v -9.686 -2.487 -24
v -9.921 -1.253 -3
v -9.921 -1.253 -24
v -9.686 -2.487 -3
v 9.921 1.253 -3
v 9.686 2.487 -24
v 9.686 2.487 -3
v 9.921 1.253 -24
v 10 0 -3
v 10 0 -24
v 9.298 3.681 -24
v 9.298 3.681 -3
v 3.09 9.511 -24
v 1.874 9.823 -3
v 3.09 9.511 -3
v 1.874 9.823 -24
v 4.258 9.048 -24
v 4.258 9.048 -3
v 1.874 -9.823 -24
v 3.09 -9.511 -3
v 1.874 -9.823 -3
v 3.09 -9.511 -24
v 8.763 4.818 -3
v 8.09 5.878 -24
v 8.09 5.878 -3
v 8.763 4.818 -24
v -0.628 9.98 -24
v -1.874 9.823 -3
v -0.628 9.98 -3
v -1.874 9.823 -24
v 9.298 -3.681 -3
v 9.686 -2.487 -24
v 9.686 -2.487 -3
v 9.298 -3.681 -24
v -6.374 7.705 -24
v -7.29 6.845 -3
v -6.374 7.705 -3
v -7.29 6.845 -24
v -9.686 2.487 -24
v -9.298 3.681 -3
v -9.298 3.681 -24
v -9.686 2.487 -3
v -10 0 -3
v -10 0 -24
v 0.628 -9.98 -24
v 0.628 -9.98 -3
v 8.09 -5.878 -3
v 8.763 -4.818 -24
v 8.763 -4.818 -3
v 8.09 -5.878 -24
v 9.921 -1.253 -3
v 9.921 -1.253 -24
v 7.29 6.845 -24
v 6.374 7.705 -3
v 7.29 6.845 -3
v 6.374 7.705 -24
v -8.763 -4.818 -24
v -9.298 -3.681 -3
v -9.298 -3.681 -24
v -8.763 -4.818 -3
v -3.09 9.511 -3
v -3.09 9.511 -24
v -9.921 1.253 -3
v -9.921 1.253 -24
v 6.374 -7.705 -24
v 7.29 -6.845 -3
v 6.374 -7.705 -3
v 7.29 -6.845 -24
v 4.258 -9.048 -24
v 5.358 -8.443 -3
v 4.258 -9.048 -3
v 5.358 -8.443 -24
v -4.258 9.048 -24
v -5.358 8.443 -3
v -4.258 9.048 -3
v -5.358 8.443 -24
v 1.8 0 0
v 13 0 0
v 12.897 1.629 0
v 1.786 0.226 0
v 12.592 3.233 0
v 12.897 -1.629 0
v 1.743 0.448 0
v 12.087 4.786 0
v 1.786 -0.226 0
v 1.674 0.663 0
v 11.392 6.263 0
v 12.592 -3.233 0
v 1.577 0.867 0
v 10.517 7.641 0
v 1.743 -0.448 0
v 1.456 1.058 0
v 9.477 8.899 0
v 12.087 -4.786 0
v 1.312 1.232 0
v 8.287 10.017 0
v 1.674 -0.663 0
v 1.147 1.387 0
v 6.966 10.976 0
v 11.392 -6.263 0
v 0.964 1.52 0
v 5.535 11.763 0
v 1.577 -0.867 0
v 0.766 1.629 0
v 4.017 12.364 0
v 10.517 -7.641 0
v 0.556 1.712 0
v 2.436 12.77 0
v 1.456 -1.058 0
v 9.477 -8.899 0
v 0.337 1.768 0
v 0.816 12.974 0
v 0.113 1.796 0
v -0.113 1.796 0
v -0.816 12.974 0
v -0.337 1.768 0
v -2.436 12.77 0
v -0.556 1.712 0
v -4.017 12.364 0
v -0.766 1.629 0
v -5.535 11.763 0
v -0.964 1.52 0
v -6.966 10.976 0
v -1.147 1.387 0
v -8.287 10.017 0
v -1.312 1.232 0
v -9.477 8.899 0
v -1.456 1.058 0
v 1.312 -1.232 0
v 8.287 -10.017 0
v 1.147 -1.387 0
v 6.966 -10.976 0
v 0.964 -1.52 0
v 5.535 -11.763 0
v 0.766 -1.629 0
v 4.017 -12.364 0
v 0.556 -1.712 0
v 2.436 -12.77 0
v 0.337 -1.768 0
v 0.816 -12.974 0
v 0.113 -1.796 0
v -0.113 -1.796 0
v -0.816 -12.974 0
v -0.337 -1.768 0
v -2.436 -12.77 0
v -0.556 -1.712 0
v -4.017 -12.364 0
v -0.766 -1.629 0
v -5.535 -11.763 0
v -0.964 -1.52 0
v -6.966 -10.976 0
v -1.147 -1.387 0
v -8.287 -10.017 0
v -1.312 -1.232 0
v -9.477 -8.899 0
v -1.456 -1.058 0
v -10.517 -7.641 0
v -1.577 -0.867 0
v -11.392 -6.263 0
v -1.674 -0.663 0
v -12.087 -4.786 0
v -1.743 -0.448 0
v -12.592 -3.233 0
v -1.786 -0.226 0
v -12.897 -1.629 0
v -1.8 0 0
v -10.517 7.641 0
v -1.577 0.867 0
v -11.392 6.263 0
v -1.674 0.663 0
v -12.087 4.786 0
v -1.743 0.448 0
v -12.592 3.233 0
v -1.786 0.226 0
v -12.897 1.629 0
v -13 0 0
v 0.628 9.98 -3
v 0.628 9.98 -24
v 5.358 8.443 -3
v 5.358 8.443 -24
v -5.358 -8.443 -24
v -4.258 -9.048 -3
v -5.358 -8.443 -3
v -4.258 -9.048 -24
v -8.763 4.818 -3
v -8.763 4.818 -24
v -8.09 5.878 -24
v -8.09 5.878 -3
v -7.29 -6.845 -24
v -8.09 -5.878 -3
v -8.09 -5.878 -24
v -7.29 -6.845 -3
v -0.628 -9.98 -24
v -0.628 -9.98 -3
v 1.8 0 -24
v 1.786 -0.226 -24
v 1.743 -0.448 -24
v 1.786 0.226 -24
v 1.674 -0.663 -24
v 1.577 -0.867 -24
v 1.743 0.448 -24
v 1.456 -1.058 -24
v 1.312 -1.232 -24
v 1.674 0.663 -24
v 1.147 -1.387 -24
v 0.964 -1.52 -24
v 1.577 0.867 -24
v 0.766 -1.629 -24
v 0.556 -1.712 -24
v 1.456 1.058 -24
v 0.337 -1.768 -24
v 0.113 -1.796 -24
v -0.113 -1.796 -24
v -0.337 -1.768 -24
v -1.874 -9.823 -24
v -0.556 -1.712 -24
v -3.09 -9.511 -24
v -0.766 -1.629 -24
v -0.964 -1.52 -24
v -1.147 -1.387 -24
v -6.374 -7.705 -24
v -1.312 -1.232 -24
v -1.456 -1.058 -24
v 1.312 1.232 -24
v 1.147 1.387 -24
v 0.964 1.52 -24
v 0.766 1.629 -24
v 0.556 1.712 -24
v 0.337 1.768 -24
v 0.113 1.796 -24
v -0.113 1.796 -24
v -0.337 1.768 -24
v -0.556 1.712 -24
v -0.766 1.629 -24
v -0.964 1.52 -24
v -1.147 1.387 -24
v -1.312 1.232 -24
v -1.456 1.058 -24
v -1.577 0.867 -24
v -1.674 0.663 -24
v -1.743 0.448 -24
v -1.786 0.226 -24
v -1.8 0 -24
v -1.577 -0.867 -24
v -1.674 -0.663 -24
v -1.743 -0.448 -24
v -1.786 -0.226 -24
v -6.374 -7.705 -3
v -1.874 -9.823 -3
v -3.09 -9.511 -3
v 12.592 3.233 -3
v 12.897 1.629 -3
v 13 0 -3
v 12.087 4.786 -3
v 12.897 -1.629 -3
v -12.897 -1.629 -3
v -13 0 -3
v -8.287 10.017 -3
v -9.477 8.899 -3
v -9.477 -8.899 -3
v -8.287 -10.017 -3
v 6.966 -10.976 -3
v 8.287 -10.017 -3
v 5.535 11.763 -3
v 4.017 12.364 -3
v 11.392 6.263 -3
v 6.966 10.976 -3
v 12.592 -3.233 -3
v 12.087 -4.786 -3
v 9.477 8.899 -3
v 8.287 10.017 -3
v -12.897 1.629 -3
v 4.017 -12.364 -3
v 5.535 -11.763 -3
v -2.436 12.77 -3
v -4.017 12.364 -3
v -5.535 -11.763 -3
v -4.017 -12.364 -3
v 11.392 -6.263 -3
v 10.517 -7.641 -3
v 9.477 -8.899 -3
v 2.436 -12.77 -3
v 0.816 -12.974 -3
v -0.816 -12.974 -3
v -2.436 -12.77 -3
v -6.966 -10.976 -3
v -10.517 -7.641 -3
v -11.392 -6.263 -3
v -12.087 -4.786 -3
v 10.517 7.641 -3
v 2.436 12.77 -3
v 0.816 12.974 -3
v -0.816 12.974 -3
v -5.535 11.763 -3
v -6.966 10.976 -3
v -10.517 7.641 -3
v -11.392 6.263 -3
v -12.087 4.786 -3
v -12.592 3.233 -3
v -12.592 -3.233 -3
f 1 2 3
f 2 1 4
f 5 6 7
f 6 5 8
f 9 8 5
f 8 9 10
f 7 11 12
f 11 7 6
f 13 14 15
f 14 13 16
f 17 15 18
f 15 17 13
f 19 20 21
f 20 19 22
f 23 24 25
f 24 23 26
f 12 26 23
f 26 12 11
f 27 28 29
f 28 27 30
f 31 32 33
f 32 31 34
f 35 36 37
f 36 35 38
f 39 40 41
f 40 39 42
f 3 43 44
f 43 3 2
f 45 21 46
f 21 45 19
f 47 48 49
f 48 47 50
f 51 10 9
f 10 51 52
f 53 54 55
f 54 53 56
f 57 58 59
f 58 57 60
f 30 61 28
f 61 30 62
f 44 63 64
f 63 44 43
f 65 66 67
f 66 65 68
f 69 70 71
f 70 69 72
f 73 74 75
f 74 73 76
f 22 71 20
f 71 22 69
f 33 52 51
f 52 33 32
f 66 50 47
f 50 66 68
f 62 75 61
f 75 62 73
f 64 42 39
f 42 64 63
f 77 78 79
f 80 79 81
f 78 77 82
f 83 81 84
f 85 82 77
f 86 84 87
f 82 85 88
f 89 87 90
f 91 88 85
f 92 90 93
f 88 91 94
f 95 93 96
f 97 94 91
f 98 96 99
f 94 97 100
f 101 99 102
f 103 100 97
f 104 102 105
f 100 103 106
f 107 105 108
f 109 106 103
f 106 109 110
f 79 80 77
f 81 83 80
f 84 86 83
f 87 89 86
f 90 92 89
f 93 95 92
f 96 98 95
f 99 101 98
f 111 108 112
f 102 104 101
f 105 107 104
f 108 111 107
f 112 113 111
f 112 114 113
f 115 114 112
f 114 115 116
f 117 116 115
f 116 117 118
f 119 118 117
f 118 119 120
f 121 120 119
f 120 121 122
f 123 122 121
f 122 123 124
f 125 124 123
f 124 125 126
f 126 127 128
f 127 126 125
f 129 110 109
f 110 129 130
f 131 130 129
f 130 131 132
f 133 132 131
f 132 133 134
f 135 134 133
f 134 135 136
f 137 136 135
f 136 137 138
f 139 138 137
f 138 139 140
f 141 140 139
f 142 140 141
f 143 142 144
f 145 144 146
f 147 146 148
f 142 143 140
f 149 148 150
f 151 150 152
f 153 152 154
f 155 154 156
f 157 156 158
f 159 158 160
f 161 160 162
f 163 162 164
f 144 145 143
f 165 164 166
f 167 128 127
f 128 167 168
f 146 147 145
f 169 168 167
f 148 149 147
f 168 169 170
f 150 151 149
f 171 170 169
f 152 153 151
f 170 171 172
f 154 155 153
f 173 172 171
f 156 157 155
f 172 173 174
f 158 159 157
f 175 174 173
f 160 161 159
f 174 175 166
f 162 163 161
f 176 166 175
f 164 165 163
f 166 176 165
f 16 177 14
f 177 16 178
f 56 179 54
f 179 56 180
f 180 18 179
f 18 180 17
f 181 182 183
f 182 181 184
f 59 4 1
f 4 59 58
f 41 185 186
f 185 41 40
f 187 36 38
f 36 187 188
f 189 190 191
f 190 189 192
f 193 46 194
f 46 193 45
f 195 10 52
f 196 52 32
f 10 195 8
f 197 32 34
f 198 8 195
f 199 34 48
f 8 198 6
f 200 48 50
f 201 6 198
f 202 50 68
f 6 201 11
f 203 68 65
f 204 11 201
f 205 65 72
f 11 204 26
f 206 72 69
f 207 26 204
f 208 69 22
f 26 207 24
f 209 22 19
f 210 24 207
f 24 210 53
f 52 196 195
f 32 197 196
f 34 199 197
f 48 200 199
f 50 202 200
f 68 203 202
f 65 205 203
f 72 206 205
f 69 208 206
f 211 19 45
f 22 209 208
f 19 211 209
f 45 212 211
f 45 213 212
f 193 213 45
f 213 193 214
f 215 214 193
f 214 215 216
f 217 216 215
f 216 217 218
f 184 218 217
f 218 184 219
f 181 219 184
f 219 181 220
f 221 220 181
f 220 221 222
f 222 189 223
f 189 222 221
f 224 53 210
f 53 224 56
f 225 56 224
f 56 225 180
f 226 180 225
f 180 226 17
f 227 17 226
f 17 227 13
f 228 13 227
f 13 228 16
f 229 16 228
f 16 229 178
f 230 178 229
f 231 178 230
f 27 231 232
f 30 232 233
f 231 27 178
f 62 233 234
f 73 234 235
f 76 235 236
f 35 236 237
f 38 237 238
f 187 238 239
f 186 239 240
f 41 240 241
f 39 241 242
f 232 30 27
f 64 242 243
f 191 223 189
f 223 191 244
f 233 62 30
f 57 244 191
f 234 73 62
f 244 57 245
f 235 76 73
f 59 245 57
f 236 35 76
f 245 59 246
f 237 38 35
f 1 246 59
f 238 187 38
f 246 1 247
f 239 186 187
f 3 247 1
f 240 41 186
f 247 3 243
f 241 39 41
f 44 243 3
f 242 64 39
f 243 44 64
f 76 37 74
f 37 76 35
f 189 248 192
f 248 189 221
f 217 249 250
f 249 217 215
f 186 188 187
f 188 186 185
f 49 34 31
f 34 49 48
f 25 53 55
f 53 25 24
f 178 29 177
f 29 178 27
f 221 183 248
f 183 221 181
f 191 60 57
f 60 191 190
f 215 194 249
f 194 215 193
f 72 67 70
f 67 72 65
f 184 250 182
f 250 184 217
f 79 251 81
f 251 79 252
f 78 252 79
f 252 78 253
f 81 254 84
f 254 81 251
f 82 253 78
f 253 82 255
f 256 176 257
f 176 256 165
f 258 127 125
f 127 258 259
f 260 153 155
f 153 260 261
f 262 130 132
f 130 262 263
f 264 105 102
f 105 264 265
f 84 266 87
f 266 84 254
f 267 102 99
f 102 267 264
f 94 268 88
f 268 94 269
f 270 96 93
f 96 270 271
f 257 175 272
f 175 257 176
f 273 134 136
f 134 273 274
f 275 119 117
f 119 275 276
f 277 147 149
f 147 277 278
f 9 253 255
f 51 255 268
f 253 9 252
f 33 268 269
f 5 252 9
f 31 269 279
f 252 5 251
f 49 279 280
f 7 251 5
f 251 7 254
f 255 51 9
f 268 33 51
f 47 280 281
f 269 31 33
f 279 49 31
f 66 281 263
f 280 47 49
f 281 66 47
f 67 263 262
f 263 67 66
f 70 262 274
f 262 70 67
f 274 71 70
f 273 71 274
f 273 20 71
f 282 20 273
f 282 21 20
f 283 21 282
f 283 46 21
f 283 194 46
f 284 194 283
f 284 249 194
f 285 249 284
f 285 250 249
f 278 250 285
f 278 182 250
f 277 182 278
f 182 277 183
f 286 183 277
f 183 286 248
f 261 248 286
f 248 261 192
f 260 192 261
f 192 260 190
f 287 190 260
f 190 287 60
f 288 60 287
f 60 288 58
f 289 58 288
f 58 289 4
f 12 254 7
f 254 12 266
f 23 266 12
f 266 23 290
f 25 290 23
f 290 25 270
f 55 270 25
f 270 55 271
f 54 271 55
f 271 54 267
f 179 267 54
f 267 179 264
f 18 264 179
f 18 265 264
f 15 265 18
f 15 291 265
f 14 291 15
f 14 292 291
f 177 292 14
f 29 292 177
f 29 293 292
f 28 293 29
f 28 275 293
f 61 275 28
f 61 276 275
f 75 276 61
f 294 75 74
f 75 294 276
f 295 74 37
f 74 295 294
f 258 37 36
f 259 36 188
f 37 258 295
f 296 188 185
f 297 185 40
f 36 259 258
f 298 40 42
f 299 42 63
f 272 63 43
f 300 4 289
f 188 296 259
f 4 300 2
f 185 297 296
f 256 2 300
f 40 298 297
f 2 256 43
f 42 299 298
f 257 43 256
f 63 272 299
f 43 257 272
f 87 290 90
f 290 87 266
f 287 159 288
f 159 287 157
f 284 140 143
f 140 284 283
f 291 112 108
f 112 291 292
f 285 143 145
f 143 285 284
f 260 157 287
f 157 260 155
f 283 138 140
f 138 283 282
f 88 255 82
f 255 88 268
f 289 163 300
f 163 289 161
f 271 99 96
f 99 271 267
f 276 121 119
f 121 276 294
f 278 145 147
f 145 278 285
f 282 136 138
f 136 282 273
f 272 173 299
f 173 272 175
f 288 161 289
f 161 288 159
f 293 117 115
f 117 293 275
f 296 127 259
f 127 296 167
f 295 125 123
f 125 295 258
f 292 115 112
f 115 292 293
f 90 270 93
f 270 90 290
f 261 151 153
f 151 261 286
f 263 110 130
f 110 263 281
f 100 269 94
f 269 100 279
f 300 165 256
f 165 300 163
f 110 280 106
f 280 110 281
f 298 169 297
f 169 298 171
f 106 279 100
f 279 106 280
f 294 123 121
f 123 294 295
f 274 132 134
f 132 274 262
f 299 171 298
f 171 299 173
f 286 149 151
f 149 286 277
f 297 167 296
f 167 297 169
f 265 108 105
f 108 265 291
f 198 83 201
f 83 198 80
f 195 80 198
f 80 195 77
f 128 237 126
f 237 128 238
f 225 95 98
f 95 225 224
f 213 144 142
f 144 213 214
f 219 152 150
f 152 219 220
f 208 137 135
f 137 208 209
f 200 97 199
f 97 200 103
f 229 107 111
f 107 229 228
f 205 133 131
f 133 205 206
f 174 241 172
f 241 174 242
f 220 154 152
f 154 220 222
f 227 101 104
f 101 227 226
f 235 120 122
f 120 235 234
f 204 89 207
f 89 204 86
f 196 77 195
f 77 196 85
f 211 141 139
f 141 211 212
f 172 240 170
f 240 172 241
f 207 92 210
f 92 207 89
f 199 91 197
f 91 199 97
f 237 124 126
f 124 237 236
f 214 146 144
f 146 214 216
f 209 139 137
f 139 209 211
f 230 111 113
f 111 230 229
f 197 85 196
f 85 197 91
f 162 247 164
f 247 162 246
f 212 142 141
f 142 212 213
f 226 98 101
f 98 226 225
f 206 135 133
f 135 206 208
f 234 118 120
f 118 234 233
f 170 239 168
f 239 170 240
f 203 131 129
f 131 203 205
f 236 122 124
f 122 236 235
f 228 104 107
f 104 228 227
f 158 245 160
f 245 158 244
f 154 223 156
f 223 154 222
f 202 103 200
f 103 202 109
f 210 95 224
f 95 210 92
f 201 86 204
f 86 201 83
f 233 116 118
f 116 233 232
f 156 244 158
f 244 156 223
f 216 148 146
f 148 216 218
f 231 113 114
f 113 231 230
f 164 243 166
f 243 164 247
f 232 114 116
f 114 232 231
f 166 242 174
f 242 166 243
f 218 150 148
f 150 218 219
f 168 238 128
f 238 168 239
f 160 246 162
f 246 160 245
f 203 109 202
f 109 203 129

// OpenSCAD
$fn = 50;


difference() {
	union() {
		translate(v = [0, 0, -24.0000000000]) {
			cylinder(h = 24, r = 10.0000000000);
		}
		translate(v = [0, 0, -3.0000000000]) {
			cylinder(h = 3, r = 13.0000000000);
		}
	}
	union() {
		#translate(v = [0, 0, -24]) {
			cylinder(h = 24, r = 1.8000000000);
		}
	}
}
